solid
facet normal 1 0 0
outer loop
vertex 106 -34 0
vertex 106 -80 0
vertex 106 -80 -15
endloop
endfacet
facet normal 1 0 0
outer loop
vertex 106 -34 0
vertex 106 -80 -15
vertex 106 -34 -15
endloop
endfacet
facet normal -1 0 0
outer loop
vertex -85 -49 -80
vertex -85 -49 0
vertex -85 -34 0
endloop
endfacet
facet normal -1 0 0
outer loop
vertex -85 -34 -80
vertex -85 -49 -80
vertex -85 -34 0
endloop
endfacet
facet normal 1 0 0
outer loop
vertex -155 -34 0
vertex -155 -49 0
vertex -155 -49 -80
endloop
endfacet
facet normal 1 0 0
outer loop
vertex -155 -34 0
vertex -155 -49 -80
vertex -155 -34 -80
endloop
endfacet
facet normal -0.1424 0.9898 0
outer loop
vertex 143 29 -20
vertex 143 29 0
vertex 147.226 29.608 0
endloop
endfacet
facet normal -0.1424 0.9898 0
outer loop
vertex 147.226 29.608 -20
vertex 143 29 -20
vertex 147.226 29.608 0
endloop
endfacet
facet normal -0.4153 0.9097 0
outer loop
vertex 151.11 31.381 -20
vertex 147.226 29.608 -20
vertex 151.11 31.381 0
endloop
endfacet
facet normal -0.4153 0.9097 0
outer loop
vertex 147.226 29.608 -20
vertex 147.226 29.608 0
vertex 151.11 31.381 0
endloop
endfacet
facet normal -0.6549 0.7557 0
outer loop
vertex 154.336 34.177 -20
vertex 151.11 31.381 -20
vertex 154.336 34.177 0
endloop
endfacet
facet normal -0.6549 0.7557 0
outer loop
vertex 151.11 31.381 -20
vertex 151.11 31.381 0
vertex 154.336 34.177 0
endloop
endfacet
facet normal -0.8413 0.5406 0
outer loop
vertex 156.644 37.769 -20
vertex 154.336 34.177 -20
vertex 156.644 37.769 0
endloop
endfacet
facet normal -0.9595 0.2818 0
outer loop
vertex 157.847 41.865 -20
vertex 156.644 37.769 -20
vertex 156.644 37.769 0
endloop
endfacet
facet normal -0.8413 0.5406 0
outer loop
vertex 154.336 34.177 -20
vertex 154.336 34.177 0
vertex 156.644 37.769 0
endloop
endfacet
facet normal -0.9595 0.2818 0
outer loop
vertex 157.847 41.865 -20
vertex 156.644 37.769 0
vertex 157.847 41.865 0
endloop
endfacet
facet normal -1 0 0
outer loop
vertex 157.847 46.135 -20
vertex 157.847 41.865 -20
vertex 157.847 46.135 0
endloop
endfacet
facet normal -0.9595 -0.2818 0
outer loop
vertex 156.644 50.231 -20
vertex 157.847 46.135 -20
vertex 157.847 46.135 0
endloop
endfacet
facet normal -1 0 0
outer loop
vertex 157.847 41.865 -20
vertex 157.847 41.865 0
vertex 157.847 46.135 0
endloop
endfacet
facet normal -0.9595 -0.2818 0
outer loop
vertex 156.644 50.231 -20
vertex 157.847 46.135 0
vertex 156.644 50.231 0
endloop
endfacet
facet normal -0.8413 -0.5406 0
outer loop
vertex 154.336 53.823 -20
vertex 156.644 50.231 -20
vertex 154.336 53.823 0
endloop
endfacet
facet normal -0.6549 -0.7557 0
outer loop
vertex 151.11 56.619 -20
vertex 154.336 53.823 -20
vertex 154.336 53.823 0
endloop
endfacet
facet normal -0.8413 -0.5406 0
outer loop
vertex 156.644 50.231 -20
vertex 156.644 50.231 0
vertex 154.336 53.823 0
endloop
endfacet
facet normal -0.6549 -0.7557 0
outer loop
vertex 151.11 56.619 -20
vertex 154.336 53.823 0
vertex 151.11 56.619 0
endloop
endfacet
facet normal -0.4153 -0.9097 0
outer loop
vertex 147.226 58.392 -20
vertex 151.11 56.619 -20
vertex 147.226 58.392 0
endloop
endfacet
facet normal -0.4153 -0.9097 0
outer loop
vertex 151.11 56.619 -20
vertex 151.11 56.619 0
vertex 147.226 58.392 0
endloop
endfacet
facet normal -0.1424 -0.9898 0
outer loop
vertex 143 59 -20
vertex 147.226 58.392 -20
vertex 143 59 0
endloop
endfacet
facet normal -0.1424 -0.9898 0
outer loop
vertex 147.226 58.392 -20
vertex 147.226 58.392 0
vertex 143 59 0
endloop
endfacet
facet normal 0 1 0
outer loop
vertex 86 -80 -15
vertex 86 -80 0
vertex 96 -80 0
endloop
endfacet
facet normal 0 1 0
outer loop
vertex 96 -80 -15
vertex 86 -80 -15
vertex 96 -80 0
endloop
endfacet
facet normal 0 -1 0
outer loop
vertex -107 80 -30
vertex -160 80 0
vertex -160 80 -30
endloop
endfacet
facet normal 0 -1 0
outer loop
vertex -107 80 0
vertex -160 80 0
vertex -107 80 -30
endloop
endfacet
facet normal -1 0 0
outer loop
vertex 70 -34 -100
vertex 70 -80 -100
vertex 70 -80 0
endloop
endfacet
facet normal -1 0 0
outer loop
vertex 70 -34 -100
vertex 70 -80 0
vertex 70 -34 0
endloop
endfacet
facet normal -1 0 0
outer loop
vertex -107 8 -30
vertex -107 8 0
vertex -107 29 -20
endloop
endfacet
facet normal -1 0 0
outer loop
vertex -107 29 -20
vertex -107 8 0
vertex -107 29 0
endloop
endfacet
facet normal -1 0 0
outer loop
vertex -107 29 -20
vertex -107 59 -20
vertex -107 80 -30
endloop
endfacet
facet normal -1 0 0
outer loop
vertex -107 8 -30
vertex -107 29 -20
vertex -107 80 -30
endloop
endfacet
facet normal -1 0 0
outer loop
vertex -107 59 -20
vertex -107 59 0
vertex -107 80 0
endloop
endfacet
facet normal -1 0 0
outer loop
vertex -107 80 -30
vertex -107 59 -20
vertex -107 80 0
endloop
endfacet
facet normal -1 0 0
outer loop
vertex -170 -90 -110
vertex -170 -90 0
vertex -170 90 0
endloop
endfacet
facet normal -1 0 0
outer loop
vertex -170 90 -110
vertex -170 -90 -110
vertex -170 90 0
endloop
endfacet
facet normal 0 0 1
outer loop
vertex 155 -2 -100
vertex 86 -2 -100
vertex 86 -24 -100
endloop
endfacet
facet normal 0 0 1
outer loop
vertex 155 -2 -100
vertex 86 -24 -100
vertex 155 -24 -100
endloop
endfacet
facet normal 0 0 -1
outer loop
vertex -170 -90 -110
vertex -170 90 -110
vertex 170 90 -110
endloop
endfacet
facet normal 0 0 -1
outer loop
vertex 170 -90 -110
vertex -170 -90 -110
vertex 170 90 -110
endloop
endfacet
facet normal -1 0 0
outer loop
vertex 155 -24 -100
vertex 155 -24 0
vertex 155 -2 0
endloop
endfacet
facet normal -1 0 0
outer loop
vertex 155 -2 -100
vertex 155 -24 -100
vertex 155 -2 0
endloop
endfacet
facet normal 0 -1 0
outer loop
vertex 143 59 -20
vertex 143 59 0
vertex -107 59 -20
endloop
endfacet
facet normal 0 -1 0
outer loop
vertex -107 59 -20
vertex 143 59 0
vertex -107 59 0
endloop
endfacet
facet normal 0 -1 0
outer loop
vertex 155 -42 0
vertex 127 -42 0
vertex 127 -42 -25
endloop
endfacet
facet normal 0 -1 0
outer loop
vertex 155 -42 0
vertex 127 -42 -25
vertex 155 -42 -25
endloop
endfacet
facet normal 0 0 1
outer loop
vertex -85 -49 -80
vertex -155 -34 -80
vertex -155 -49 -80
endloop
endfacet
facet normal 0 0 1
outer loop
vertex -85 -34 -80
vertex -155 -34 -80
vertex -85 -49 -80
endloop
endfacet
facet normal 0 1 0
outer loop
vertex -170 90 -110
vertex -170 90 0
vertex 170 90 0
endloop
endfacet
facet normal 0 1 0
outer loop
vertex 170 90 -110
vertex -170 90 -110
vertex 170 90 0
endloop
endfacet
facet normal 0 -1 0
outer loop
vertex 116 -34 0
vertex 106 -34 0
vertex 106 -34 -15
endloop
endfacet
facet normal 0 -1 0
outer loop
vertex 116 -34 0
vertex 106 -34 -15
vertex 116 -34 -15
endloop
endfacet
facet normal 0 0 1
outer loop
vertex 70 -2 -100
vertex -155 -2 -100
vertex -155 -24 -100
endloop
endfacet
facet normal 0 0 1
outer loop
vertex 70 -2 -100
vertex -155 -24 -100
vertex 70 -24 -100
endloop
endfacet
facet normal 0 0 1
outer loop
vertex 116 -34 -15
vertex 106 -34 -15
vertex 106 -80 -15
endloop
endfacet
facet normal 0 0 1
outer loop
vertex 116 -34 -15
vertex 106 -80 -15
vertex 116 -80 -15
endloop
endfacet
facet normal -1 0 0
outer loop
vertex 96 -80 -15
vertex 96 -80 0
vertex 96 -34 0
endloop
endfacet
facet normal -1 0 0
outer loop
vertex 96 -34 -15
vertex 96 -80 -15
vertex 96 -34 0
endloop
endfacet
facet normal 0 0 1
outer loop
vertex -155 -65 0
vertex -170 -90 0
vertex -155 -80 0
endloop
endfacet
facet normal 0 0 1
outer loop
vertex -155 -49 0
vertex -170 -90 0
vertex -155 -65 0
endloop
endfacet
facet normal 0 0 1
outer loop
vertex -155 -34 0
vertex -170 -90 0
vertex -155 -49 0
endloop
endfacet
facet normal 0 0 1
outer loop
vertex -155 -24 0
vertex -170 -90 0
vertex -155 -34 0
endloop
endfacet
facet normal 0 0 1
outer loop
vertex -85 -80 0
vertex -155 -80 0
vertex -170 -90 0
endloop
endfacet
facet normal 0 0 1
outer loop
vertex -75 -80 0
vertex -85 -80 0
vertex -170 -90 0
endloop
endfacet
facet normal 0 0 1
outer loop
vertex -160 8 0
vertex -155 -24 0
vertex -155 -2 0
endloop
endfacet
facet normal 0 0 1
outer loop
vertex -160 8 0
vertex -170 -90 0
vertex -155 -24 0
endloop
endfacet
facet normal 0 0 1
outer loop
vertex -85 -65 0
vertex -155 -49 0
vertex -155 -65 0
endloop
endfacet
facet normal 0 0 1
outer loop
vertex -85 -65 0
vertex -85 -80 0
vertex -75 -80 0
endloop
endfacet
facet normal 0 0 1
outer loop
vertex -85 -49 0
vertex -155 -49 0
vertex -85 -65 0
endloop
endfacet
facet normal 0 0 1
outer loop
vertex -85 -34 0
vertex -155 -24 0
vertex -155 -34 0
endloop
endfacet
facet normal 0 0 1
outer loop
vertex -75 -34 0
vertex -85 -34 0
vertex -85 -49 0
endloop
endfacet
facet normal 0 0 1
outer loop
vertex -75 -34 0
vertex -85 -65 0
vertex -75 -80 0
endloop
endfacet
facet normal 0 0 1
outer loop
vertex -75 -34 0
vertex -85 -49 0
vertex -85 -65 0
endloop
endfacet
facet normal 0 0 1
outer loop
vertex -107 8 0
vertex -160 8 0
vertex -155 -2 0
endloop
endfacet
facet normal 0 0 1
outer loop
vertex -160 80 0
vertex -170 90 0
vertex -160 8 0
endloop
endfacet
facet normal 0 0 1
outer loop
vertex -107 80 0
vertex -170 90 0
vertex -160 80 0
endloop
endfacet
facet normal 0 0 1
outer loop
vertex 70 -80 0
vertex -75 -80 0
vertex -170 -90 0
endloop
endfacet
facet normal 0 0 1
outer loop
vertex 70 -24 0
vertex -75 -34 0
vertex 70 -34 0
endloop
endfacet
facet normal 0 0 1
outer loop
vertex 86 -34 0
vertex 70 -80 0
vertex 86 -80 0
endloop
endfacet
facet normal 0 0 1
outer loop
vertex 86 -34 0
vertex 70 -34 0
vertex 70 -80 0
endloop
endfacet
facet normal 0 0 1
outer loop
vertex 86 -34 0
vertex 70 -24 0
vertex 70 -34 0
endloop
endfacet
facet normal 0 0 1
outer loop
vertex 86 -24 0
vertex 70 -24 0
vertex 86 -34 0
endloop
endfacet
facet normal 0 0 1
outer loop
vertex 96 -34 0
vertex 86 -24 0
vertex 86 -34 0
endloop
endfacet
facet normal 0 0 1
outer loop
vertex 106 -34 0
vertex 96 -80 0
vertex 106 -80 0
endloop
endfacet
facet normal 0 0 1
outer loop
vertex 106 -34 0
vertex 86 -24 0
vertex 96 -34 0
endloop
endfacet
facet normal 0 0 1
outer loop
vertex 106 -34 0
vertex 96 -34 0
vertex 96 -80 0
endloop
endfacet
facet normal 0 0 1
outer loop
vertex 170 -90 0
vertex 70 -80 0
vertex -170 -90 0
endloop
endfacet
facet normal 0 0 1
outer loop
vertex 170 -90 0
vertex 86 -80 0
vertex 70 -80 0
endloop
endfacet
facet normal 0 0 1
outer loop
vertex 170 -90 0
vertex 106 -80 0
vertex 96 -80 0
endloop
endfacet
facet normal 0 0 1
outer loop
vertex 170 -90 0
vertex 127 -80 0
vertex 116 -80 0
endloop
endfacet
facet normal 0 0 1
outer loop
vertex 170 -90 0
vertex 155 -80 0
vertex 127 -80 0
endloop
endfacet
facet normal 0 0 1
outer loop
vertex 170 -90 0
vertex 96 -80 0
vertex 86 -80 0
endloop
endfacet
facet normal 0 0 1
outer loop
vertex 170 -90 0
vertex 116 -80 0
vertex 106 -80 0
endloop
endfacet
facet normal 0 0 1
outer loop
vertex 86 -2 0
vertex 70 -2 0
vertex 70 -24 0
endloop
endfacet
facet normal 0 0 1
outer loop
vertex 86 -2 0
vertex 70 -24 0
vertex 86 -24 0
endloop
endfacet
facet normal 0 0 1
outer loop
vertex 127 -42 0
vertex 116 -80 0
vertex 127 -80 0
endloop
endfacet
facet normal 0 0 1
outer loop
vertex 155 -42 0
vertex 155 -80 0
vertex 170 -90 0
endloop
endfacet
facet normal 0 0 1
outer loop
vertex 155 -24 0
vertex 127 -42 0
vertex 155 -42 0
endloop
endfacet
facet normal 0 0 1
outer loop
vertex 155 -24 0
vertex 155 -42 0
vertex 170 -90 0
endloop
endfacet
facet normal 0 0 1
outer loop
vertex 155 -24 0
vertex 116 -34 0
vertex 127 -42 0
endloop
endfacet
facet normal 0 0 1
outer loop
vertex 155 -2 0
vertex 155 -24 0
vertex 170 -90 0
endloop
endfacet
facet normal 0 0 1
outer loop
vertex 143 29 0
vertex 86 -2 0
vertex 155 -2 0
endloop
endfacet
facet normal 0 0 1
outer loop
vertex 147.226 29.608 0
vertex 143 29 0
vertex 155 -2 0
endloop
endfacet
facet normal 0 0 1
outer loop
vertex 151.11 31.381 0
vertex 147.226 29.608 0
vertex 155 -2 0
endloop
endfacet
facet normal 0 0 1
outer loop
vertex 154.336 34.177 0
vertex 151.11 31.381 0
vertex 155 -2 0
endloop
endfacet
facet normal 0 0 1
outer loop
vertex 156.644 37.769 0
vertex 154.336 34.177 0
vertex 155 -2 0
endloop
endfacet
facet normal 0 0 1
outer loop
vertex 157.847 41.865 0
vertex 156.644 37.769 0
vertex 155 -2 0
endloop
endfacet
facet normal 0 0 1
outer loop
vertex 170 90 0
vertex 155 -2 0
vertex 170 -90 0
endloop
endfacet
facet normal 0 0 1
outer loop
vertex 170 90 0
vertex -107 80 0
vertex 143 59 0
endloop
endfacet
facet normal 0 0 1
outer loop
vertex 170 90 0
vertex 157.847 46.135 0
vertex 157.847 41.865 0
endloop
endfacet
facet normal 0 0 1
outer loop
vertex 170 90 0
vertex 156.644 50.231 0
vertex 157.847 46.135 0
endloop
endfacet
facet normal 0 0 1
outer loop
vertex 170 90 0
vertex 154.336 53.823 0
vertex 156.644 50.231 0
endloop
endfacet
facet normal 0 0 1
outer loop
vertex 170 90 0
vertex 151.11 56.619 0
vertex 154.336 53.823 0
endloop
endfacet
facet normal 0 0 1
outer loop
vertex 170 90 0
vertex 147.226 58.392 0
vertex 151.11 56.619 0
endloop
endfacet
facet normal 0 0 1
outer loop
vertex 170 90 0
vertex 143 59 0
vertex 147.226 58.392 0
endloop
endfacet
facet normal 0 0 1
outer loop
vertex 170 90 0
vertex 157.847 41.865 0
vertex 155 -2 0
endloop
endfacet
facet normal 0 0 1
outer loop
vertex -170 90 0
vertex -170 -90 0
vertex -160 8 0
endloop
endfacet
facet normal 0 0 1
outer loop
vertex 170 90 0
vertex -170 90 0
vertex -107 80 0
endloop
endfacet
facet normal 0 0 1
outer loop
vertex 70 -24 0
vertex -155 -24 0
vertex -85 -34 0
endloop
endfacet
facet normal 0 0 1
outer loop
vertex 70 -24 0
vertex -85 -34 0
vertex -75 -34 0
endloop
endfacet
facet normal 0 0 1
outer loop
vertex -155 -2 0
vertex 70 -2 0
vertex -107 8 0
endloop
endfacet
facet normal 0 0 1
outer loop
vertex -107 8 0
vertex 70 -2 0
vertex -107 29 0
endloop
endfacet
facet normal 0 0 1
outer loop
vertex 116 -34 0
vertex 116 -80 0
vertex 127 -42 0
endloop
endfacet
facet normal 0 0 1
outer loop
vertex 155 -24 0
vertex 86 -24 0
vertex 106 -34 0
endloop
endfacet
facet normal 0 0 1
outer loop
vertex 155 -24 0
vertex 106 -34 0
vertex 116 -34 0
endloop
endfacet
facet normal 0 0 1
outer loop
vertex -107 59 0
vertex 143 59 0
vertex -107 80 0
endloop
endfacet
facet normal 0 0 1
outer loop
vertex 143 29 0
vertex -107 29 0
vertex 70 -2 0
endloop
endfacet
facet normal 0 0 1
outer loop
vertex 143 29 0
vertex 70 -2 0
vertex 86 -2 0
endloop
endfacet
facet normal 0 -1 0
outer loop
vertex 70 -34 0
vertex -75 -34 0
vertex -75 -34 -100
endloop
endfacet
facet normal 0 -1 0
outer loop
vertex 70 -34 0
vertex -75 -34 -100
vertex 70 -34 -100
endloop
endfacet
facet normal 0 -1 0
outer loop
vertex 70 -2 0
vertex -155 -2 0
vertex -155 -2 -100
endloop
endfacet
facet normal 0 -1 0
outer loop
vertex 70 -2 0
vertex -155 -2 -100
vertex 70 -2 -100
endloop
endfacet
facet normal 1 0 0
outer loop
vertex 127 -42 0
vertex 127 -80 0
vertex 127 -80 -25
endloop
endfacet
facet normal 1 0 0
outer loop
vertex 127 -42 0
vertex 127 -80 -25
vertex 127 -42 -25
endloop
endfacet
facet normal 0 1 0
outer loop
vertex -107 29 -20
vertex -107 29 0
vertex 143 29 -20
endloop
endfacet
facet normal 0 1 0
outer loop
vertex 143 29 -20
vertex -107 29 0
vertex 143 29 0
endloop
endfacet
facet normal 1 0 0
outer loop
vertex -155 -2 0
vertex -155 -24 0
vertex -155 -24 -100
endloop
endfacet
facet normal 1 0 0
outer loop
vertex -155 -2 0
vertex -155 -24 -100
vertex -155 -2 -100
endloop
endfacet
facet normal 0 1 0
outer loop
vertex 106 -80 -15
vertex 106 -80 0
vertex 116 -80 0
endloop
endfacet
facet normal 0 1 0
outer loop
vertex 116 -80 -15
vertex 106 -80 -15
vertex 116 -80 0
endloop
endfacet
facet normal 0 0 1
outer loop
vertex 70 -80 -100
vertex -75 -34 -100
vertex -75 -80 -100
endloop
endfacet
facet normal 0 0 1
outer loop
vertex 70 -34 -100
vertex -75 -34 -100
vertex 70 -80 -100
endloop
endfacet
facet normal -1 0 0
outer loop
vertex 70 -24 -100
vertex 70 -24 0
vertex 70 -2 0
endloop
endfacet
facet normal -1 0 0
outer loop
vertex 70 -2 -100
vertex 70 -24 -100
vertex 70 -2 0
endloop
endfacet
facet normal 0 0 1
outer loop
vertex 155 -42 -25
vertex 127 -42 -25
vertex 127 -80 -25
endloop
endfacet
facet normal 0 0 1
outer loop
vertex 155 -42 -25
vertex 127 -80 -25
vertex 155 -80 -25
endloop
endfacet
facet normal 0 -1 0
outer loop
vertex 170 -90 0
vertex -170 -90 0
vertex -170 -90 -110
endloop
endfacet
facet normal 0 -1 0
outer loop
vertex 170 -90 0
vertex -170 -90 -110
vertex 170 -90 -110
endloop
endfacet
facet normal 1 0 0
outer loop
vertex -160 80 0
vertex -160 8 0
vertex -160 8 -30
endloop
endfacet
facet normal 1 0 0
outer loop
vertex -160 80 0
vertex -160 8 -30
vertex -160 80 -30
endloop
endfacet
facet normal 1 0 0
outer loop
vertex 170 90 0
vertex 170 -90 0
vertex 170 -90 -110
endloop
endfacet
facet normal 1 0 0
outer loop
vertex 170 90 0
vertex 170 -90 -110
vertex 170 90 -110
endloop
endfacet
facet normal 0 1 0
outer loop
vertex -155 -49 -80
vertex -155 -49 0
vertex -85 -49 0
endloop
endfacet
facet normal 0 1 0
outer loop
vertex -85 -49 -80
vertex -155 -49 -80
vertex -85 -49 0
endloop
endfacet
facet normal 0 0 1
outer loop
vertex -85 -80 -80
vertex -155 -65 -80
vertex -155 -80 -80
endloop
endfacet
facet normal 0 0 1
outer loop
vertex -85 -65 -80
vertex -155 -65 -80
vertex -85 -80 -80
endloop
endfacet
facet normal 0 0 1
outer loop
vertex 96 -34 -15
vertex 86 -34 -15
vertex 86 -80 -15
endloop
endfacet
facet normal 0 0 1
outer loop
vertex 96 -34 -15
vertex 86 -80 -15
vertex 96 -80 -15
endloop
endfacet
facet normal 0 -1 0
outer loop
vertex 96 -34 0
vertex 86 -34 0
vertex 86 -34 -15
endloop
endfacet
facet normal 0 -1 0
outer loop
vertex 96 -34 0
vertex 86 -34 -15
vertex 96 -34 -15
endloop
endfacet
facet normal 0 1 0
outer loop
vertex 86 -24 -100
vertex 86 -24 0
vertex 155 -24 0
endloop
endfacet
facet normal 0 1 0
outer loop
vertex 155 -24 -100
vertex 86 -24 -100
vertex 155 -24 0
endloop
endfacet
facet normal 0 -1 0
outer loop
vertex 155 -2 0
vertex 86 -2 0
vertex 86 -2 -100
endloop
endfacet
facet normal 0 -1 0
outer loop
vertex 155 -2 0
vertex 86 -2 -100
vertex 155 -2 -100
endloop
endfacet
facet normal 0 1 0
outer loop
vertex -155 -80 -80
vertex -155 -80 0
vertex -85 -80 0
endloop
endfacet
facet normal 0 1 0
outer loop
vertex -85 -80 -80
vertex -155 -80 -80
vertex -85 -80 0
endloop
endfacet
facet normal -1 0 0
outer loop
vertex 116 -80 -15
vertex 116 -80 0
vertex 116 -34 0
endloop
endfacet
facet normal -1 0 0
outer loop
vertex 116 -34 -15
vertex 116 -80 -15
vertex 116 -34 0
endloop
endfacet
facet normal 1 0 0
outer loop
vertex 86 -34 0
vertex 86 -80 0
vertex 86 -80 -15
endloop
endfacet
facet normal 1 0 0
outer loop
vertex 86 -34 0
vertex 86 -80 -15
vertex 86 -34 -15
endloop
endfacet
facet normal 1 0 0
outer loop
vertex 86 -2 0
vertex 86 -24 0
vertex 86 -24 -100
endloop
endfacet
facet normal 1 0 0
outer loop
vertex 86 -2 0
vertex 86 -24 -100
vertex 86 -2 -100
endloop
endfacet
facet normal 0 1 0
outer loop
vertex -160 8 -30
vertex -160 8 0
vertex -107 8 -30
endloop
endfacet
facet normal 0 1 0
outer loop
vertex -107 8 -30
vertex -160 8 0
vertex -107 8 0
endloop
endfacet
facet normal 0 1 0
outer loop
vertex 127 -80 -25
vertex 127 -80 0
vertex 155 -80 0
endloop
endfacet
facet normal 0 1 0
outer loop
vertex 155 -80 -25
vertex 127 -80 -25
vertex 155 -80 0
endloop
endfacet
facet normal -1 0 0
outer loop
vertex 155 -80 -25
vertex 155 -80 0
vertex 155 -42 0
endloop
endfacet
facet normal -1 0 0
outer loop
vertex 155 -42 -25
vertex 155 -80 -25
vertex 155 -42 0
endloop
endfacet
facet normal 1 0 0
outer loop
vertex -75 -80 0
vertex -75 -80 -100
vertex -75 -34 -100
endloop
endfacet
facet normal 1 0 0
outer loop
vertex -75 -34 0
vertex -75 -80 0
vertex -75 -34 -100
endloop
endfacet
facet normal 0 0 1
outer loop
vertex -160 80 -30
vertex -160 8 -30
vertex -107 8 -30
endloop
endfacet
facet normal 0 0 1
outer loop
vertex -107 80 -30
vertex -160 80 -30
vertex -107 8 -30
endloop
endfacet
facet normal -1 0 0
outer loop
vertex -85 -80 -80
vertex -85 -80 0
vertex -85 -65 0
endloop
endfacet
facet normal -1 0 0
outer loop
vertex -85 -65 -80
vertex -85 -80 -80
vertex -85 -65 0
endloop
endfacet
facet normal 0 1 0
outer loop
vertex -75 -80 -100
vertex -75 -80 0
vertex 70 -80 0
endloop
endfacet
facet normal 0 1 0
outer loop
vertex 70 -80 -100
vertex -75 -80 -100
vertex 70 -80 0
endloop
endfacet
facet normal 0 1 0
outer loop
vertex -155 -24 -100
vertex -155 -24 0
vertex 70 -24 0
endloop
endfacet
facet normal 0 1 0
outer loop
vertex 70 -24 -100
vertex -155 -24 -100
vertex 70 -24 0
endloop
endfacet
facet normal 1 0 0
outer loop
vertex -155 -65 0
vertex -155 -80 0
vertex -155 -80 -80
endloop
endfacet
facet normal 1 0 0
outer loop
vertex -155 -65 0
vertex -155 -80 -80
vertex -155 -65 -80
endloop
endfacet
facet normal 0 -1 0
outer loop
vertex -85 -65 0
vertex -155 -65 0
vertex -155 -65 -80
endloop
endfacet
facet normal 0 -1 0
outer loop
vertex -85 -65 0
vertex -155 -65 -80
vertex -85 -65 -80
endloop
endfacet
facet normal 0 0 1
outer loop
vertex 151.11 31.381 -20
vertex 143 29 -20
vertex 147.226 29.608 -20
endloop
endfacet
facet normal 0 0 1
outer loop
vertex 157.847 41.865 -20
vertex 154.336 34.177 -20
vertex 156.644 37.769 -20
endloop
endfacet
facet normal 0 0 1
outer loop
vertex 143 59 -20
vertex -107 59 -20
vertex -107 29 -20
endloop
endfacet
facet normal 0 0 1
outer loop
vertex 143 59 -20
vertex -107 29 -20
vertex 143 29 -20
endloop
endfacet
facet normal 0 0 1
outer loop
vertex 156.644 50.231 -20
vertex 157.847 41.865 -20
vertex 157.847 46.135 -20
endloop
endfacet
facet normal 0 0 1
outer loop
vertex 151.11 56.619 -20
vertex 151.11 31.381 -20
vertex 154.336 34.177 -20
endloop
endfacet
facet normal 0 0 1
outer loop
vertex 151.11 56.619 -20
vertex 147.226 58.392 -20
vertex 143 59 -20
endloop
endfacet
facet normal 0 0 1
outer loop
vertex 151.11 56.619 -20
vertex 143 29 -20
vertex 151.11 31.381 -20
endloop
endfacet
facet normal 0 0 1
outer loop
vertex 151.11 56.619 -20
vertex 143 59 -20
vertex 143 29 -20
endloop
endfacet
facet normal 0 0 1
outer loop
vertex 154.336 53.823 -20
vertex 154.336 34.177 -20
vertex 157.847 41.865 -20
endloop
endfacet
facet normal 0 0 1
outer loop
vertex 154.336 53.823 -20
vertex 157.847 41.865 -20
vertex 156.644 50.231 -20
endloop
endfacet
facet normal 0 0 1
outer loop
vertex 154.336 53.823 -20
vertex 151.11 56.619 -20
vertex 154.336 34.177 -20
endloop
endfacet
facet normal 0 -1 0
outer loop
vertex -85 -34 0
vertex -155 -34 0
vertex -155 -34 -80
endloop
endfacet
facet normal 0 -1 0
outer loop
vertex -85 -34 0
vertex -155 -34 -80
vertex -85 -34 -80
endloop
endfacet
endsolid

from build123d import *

# Parameters (mm, degrees)
F0_W      = 340
F0_H      = 180
F1_DEPTH  = 110
F2_W      = 53
F2_H      = 72
F4_DEPTH  = 30
F5_DEPTH  = 20
F7_W      = 225
F7_H      = 22
F12_DEPTH = 100
F6_W      = 70
F6_H      = 15
F13_DEPTH = 80
F8_W      = 145
F8_H      = 46
F14_DEPTH = 100
F9_W      = 69
F9_H      = 22
F15_DEPTH = 100
F10_W     = 10
F10_H     = 46
F16_DEPTH = 15
F11_W     = 28
F11_H     = 38
F17_DEPTH = 25


with BuildPart() as f1:
    # F0 (on Top) → F1 (new body)
    with BuildSketch(Plane.XY):
        Rectangle(F0_W, F0_H)
    extrude(amount=-F1_DEPTH)

    # F2 (on face) → F4 (cut)
    with BuildSketch(Plane.XY):
        with Locations((-133.5, 44)):
            Rectangle(F2_W, F2_H)
    extrude(amount=-F4_DEPTH, mode=Mode.SUBTRACT)

    # F3 (on face) → F5 (cut)
    with BuildSketch(Plane.XY):
        with BuildLine():
            Line((143, 59), (-107, 59))
            Line((-107, 59), (-107, 29))
            Line((-107, 29), (143, 29))
            ThreePointArc((143, 29), (158, 44), (143, 59))
        make_face()
    extrude(amount=-F5_DEPTH, mode=Mode.SUBTRACT)

    # F7 (on face) → F12 (cut)
    with BuildSketch(Plane.XY):
        with Locations((-42.5, -13)):
            Rectangle(F7_W, F7_H)
    extrude(amount=-F12_DEPTH, mode=Mode.SUBTRACT)

    # F6 (on face) → F13 (cut)
    with BuildSketch(Plane.XY):
        with Locations((-120, -72.5)):
            Rectangle(F6_W, F6_H)
        with Locations((-120, -41.5)):
            Rectangle(F6_W, F6_H)
    extrude(amount=-F13_DEPTH, mode=Mode.SUBTRACT)

    # F8 (on face) → F14 (cut)
    with BuildSketch(Plane.XY):
        with Locations((-2.5, -57)):
            Rectangle(F8_W, F8_H)
    extrude(amount=-F14_DEPTH, mode=Mode.SUBTRACT)

    # F9 (on face) → F15 (cut)
    with BuildSketch(Plane.XY):
        with Locations((120.5, -13)):
            Rectangle(F9_W, F9_H)
    extrude(amount=-F15_DEPTH, mode=Mode.SUBTRACT)

    # F10 (on face) → F16 (cut)
    with BuildSketch(Plane.XY):
        with Locations((91, -57)):
            Rectangle(F10_W, F10_H)
        with Locations((111, -57)):
            Rectangle(F10_W, F10_H)
    extrude(amount=-F16_DEPTH, mode=Mode.SUBTRACT)

    # F11 (on face) → F17 (cut)
    with BuildSketch(Plane.XY):
        with Locations((141, -61)):
            Rectangle(F11_W, F11_H)
    extrude(amount=-F17_DEPTH, mode=Mode.SUBTRACT)


solid = f1.part
